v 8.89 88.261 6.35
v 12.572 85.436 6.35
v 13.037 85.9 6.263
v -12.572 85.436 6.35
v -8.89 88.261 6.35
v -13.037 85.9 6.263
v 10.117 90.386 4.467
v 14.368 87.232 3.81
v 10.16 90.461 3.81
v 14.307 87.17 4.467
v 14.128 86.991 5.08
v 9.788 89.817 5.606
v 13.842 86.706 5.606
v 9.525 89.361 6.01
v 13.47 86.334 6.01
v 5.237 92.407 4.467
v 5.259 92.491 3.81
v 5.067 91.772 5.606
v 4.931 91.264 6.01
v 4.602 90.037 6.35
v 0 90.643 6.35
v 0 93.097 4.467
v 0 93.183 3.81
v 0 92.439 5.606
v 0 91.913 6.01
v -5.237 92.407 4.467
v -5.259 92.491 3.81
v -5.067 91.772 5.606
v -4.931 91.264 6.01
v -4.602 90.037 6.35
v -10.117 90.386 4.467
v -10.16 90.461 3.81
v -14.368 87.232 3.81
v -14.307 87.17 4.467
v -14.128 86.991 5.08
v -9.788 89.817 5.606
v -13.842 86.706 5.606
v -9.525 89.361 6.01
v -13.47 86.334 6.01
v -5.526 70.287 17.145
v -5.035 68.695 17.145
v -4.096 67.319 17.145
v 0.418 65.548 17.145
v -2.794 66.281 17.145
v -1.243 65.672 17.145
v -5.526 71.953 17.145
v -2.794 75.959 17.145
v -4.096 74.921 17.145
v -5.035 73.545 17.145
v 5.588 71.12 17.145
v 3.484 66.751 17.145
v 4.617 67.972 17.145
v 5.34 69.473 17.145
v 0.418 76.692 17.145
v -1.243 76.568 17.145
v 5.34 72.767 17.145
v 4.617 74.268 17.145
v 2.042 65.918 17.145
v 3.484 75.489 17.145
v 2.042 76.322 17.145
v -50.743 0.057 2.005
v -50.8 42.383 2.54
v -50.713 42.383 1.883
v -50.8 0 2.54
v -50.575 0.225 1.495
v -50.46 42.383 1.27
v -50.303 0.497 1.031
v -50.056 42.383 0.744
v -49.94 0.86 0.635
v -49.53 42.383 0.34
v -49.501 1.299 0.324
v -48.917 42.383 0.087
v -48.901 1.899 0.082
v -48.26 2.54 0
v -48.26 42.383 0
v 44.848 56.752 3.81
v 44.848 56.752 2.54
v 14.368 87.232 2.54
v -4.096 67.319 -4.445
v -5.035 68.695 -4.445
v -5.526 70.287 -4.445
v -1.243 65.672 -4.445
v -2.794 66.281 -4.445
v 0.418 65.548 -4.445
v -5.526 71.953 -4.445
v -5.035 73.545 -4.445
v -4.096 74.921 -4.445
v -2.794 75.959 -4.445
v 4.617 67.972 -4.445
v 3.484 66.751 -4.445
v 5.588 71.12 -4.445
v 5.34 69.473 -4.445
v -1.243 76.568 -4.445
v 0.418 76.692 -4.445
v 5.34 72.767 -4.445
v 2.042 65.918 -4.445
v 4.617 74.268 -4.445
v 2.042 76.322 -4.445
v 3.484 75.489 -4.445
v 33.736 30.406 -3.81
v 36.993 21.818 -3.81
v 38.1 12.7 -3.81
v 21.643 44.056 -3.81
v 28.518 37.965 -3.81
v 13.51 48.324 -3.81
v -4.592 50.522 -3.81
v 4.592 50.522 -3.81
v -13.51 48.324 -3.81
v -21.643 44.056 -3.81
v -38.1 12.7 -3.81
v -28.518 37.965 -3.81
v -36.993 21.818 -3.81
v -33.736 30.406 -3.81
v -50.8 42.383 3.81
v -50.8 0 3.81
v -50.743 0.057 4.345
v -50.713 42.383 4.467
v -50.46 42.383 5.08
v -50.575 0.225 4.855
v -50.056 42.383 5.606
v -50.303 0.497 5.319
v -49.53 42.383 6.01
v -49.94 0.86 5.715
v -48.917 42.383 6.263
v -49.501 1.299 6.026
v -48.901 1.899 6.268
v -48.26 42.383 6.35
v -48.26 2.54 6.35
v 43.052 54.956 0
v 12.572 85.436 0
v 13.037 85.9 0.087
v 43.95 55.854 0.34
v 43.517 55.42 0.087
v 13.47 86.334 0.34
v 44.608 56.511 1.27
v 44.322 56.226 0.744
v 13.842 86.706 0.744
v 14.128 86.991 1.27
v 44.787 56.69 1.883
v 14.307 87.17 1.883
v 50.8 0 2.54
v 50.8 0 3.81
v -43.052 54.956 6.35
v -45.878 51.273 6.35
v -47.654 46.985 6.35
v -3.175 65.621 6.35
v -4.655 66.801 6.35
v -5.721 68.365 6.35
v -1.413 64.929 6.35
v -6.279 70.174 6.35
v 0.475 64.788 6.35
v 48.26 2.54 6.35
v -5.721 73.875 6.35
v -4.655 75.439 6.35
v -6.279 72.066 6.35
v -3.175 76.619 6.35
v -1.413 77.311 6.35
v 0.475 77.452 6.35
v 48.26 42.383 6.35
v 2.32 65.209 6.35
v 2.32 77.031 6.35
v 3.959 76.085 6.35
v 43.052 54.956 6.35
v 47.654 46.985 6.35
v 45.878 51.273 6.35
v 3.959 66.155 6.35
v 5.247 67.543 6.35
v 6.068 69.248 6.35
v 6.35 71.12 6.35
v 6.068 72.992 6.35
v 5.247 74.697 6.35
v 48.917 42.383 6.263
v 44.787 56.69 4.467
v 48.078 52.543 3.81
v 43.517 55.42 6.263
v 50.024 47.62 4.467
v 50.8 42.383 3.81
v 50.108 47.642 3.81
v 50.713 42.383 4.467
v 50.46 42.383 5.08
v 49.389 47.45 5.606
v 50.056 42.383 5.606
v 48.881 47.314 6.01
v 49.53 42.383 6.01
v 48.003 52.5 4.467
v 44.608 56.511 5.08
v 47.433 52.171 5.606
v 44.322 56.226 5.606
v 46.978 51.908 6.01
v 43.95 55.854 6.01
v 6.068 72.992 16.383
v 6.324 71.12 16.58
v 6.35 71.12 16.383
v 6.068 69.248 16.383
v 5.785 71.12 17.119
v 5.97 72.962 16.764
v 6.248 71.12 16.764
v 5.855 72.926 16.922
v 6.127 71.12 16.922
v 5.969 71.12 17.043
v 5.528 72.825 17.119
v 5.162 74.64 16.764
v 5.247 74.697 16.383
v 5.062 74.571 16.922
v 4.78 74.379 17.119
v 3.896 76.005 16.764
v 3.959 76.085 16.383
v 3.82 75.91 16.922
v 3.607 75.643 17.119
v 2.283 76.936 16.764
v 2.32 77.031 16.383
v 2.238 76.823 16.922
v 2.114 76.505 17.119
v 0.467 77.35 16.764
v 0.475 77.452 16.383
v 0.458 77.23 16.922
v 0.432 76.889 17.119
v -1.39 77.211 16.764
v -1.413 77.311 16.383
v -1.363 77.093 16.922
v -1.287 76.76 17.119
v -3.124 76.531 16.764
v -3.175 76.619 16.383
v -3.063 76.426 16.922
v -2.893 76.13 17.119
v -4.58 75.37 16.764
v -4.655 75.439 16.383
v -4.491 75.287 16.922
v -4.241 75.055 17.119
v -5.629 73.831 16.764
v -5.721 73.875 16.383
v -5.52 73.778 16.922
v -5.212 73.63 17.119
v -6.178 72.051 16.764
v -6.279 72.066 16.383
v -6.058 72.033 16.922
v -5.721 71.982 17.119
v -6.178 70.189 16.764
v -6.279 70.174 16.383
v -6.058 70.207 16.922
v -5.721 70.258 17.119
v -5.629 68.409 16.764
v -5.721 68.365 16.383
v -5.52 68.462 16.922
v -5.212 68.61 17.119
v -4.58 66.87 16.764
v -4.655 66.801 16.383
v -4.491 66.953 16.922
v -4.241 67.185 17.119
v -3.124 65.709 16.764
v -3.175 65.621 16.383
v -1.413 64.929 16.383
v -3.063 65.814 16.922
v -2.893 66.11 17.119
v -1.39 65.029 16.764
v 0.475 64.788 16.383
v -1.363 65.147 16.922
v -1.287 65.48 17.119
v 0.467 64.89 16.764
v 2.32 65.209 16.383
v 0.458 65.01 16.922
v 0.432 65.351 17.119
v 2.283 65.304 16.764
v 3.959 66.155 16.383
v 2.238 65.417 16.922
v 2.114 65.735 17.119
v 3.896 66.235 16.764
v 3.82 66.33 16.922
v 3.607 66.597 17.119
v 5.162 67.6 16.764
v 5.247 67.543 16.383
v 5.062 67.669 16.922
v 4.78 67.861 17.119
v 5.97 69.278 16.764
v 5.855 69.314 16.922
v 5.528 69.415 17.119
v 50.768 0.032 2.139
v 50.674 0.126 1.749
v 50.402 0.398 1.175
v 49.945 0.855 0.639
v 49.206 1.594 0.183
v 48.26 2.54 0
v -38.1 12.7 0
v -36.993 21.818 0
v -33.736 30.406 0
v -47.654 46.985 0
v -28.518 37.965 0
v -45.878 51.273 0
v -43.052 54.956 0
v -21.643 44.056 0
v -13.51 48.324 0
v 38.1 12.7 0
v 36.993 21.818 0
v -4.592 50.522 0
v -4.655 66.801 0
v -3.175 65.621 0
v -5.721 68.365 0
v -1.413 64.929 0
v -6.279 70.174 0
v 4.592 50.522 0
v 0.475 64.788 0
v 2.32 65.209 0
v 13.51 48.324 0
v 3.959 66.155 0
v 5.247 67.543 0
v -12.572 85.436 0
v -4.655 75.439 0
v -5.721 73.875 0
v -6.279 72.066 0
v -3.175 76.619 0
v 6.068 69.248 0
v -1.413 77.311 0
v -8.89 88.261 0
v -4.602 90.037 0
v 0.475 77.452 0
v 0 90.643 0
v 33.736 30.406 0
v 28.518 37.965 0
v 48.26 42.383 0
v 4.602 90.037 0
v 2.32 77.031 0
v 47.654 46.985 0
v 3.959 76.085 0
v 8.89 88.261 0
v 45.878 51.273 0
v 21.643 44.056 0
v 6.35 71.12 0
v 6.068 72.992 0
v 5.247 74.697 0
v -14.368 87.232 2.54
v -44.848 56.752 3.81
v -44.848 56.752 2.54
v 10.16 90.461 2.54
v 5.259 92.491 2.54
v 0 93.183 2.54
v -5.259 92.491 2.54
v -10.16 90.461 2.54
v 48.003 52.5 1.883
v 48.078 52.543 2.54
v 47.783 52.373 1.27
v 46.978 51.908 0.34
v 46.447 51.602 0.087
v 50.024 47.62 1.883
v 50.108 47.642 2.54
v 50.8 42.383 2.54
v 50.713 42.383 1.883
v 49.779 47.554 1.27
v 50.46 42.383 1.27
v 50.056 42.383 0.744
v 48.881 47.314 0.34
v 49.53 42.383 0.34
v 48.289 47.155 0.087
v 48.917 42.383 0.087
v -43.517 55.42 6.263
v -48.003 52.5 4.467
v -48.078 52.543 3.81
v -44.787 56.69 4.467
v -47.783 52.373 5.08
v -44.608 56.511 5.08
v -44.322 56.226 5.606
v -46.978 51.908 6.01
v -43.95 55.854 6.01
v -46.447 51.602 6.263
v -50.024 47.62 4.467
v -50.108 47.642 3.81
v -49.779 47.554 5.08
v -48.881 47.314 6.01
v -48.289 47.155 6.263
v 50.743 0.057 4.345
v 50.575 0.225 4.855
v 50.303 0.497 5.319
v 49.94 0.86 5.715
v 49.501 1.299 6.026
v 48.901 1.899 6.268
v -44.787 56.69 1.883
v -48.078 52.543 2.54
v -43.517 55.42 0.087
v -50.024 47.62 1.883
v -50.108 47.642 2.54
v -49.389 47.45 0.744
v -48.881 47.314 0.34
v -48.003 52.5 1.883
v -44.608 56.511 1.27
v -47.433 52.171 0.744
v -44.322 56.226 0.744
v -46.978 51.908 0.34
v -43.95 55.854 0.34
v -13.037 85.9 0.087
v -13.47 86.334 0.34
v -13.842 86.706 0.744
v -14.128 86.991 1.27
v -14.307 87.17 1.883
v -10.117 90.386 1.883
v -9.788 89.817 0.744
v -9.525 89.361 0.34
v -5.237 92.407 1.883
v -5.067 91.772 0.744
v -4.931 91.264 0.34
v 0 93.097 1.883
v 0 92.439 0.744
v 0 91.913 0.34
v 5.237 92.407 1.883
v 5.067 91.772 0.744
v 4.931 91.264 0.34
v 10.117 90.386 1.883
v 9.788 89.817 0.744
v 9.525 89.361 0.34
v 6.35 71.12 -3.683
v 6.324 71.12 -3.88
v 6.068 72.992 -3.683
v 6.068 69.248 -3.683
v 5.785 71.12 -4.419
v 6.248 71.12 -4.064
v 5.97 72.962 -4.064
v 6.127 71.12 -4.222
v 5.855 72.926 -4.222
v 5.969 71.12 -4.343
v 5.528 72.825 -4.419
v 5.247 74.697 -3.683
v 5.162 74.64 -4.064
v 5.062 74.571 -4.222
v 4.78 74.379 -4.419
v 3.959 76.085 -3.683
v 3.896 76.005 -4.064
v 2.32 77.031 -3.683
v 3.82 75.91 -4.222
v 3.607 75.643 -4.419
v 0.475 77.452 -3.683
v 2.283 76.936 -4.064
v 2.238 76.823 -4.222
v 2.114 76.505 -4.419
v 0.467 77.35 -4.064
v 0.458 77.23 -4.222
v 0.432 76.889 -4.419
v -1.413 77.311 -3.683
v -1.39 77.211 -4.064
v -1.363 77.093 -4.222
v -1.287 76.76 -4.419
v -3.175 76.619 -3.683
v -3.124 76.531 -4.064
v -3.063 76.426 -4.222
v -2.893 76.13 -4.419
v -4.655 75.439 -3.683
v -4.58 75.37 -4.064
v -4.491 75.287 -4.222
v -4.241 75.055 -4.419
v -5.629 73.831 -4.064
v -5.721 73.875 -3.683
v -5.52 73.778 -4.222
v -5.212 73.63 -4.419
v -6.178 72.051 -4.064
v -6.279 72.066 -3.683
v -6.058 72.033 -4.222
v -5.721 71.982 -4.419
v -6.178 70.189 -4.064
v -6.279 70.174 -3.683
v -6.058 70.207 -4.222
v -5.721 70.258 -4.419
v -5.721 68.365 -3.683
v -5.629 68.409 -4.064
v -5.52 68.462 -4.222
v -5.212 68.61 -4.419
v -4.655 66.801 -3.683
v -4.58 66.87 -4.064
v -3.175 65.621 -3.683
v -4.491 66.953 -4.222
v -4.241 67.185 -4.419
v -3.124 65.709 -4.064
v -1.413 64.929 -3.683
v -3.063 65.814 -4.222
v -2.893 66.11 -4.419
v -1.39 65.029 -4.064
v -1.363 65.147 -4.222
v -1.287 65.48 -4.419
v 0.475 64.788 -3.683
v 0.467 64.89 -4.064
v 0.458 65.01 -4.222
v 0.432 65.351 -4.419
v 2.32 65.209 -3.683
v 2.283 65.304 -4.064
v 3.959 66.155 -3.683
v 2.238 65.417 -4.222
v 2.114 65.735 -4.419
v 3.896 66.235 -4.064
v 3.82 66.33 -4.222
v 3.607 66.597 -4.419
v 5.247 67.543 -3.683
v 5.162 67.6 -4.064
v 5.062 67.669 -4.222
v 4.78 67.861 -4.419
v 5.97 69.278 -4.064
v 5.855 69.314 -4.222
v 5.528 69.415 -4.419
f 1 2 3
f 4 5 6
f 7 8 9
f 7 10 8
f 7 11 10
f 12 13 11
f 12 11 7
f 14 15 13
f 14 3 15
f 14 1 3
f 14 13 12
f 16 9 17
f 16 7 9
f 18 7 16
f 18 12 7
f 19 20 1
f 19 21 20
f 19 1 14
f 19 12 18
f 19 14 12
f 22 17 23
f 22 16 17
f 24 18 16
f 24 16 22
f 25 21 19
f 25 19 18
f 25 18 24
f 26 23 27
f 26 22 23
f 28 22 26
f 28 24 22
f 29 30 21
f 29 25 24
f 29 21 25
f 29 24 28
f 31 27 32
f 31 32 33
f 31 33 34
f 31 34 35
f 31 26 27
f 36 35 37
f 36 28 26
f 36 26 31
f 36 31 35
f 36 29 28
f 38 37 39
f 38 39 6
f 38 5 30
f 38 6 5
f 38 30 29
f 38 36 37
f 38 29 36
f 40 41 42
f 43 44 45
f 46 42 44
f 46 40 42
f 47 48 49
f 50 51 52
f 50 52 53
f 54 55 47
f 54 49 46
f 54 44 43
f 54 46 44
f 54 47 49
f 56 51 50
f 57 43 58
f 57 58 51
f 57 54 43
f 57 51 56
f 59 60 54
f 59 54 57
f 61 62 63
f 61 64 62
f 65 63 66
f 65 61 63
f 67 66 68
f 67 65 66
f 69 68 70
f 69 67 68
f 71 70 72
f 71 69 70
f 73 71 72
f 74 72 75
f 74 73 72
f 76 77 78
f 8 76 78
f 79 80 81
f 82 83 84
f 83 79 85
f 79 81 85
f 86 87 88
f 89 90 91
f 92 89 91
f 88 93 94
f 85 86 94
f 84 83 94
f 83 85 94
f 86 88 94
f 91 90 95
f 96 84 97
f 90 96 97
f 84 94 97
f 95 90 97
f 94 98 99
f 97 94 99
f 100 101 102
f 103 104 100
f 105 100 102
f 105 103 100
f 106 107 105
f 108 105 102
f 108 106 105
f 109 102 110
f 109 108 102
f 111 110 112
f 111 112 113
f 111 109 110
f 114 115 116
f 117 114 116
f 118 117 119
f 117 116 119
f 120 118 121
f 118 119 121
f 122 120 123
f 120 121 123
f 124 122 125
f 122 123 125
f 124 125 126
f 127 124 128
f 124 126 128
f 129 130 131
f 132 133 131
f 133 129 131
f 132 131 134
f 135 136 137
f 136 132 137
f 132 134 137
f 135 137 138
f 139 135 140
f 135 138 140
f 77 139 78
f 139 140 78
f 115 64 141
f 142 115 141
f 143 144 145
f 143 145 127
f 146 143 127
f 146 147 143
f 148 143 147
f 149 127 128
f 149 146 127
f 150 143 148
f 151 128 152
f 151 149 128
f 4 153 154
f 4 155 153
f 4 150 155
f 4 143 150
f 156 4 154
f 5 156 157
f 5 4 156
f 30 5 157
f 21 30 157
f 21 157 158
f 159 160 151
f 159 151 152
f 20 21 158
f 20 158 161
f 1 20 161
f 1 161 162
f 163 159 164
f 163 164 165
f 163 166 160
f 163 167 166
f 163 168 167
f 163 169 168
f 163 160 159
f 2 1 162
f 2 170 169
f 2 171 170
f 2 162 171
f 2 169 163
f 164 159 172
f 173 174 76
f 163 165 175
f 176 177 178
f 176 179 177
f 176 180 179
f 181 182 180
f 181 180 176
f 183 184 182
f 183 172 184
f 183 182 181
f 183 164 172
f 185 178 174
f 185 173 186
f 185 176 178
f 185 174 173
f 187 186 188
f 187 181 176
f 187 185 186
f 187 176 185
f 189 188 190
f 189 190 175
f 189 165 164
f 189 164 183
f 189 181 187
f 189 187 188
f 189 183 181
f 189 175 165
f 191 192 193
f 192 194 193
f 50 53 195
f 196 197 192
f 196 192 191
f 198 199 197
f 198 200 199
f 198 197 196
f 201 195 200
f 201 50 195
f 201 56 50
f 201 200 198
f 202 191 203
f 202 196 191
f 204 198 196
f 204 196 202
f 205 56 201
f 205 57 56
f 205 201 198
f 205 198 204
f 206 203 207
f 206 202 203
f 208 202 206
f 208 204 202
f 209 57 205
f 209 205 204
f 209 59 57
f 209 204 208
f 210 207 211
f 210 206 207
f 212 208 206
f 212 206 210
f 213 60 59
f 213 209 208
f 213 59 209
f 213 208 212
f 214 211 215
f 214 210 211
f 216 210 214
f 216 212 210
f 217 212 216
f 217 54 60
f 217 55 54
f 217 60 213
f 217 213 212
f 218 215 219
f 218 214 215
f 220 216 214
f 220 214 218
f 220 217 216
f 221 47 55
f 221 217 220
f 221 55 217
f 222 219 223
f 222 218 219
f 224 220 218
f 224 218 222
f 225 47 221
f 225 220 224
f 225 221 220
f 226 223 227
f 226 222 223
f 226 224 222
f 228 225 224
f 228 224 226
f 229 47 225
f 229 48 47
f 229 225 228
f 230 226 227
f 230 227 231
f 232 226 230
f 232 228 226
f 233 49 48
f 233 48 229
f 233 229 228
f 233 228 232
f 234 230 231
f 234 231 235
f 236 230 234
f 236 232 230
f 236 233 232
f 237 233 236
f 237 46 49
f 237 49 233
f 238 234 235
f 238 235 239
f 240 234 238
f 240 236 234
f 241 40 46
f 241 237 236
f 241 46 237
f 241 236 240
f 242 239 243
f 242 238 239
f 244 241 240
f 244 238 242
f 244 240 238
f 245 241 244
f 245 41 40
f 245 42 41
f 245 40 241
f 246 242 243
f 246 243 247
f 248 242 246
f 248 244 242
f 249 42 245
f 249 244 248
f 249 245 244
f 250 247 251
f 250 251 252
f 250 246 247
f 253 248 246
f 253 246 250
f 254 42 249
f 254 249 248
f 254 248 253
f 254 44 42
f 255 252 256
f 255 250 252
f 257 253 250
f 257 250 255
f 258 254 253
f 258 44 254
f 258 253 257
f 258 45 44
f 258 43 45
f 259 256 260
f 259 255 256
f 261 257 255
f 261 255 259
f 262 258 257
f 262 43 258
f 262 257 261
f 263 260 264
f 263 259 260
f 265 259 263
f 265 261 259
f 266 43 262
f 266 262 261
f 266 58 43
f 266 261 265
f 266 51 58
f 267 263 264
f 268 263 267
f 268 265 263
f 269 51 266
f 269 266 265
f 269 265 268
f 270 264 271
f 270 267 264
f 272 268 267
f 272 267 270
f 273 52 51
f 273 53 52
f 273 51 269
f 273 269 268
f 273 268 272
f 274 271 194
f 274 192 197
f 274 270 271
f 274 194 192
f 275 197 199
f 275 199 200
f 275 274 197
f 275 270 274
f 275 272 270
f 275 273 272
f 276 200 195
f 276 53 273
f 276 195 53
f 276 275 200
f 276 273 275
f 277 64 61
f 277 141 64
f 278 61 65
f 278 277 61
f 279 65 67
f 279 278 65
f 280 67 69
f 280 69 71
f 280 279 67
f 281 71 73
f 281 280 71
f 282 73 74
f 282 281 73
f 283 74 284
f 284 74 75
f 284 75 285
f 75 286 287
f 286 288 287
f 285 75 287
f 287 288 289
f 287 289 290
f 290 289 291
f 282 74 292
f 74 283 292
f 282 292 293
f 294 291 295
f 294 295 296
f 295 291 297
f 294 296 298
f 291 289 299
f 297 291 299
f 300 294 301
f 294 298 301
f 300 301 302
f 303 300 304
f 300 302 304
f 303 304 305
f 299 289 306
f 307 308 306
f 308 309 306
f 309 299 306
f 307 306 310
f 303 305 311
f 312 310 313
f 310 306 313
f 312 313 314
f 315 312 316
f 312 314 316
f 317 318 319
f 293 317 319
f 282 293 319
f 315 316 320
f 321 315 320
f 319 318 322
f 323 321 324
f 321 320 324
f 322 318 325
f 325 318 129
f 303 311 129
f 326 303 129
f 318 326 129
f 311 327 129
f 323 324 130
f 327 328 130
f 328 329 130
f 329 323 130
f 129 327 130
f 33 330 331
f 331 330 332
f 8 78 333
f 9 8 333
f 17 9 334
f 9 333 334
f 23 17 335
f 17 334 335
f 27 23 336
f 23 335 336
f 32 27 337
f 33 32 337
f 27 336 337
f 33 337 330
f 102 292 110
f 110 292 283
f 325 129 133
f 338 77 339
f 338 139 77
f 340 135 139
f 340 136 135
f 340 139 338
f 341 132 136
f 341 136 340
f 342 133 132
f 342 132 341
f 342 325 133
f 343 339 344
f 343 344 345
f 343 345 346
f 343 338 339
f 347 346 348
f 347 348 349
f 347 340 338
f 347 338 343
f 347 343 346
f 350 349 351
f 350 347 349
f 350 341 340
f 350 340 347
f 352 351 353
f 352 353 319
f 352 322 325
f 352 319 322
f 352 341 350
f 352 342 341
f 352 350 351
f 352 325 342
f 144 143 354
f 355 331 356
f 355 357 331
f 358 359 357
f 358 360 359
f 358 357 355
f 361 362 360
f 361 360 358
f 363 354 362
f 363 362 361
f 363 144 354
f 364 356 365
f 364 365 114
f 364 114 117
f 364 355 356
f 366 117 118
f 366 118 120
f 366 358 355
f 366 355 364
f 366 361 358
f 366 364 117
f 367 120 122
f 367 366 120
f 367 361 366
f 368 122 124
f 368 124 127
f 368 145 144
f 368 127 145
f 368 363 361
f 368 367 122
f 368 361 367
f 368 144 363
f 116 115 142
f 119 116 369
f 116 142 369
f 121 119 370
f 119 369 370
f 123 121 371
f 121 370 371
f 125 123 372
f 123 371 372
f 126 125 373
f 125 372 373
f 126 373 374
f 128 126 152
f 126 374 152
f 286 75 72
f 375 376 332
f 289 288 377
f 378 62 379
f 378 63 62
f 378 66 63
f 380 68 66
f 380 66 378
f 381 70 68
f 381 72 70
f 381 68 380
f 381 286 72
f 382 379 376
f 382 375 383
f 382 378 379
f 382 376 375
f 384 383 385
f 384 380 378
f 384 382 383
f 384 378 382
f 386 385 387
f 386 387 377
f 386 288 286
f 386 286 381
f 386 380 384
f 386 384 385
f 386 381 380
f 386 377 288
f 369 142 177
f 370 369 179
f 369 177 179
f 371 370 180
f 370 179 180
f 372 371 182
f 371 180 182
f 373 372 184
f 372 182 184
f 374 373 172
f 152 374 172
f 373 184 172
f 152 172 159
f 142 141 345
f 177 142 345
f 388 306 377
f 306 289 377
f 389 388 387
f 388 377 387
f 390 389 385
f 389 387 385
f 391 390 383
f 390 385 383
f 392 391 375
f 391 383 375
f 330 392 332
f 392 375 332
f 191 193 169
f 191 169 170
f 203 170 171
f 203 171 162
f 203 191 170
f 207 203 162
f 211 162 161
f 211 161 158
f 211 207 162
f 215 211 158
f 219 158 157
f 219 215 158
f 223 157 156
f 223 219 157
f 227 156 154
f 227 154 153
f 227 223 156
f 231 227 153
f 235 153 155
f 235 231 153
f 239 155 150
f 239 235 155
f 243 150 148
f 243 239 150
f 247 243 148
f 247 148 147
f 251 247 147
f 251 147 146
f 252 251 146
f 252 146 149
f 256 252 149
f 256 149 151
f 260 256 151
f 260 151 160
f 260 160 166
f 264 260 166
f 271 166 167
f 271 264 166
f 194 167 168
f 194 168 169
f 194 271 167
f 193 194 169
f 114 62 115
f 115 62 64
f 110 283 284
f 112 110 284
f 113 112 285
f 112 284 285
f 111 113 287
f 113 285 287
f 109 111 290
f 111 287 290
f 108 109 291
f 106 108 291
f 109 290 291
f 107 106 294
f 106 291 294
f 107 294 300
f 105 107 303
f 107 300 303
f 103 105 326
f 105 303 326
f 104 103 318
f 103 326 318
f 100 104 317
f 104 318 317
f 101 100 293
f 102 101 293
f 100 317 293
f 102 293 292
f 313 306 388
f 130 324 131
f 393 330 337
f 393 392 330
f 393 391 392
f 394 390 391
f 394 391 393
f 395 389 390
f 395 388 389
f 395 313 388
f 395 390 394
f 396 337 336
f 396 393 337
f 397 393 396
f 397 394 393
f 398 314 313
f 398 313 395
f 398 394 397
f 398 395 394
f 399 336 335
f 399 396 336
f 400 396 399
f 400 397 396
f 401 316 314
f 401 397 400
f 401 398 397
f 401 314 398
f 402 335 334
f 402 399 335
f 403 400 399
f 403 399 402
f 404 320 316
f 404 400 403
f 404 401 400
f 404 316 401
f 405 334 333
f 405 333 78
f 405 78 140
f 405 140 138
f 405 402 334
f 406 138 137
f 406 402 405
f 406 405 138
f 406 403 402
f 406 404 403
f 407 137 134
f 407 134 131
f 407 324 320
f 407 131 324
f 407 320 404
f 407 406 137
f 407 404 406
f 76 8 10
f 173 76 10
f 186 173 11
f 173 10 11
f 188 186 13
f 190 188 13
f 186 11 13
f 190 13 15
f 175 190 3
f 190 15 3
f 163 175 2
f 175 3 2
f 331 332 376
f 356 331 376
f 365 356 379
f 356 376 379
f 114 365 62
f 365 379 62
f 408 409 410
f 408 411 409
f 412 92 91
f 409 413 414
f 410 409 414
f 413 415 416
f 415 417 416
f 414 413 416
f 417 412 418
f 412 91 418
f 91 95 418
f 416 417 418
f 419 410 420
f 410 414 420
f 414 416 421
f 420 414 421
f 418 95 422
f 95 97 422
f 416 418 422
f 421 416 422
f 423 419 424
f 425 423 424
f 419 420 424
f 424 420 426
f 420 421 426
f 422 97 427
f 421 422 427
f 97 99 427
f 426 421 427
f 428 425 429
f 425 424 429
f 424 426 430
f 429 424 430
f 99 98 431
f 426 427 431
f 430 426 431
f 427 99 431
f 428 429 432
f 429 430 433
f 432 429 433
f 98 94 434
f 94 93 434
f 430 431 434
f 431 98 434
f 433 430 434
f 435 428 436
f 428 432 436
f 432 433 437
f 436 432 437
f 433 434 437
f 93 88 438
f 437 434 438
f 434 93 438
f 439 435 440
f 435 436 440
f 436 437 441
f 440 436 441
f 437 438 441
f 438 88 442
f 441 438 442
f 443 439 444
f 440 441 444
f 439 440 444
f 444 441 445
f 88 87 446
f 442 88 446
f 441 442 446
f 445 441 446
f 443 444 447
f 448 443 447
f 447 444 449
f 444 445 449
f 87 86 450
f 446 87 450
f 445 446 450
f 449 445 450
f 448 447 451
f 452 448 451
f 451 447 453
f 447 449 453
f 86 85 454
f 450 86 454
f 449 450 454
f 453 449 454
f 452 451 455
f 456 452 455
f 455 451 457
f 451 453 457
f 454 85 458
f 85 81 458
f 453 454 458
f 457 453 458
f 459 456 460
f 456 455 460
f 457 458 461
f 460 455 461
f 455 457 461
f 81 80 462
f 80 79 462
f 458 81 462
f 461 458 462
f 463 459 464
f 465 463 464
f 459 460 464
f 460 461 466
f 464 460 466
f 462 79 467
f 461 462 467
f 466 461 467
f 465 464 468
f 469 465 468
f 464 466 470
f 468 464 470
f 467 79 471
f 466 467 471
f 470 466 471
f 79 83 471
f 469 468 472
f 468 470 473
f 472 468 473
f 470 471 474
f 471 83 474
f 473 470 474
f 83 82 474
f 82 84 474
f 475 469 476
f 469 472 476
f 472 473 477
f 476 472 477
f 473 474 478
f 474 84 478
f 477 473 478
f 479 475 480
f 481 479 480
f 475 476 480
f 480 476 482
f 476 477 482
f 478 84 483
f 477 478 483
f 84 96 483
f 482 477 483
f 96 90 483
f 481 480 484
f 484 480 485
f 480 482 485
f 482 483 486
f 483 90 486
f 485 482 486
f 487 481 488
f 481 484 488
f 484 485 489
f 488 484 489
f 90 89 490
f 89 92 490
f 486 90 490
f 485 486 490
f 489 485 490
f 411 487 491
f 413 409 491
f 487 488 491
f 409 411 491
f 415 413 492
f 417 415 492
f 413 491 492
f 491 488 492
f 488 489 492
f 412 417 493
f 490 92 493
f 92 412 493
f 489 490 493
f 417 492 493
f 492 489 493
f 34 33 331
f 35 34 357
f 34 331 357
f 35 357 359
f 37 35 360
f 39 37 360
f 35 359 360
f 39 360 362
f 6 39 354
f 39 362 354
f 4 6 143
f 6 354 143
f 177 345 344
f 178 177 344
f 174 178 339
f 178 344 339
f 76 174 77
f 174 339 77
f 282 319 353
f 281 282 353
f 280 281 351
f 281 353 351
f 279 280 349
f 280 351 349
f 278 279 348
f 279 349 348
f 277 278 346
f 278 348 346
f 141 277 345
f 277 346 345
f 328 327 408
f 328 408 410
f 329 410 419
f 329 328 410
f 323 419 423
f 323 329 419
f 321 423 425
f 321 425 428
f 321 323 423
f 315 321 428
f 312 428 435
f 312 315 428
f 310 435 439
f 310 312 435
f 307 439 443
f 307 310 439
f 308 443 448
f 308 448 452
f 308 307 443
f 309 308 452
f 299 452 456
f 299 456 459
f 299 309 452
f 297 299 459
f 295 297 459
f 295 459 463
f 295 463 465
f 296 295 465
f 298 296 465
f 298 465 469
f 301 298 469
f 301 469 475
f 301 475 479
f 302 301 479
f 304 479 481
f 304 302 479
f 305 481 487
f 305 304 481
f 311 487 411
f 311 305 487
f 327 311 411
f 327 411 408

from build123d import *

# Parameters (mm, degrees)
BOSS_EXTRUDE1_DEPTH = 6.35
FILLET1_R           = 2.54
FILLET2_R           = 2.54
FILLET3_R           = 20.32
SKETCH3_R           = 6.35
BOSS_EXTRUDE2_DEPTH = 10.795
FILLET5_R           = 0.762
BOSS_EXTRUDE3_DEPTH = 3.81


with BuildPart() as part:
    # Sketch1 → Boss-Extrude1 (new body)
    with BuildSketch(Plane.XY):
        Polygon((-50.8, 0), (50.8, 0), (50.8, 50.8), (0, 101.6), (-50.8, 50.8), align=None)
    extrude(amount=BOSS_EXTRUDE1_DEPTH)

    # Fillet1
    fillet1_edges = [part.edges().sort_by_distance(p)[0] for p in [
        (50.8, 25.4, 6.35),
        (25.4, 76.2, 6.35),
        (-25.4, 76.2, 6.35),
        (-50.8, 25.4, 6.35),
        (0, 0, 6.35),
    ]]
    fillet(fillet1_edges, radius=FILLET1_R)

    # Fillet2
    fillet2_edges = [part.edges().sort_by_distance(p)[0] for p in [
        (-25.4, 76.2, 0),
        (25.4, 76.2, 0),
        (50.8, 25.4, 0),
        (0, 0, 0),
        (-50.8, 25.4, 0),
    ]]
    fillet(fillet2_edges, radius=FILLET2_R)

    # Fillet3
    # the kernel refuses this fillet: 20.32 mm, written as the material it takes off along each edge
    with BuildSketch(Plane(origin=(30.48, 42.383180413, 6.35), x_dir=(1, 0, 0), z_dir=(0, -1, 0))) as fillet3_piece_1:
        with BuildLine():
            CenterArc((17.78, -2.54), 2.54, 0, 90)
            Line((20.32, -2.54), (20.32, 0))
            Line((20.32, 0), (17.78, 0))
        make_face()
    revolve(axis=Axis((30.48, 42.383180413, 6.35), (0, 0, 1)), revolution_arc=45, mode=Mode.SUBTRACT)
    with BuildSketch(Plane(origin=(0, 72.863180413, 6.35), x_dir=(0.7071067811865475, 0.7071067811865477, 0), z_dir=(0.7071067811865477, -0.7071067811865475, 0))) as fillet3_piece_2:
        with BuildLine():
            CenterArc((17.78, -2.54), 2.54, 0, 90)
            Line((20.32, -2.54), (20.32, 0))
            Line((20.32, 0), (17.78, 0))
        make_face()
    revolve(axis=Axis((0, 72.863180413, 6.35), (0, 0, 1)), revolution_arc=90, mode=Mode.SUBTRACT)
    with BuildSketch(Plane(origin=(-30.48, 42.383180413, 6.35), x_dir=(-0.7071067811865475, 0.7071067811865476, 0), z_dir=(0.7071067811865476, 0.7071067811865475, 0))) as fillet3_piece_3:
        with BuildLine():
            CenterArc((17.78, -2.54), 2.54, 0, 90)
            Line((20.32, -2.54), (20.32, 0))
            Line((20.32, 0), (17.78, 0))
        make_face()
    revolve(axis=Axis((-30.48, 42.383180413, 6.35), (0, 0, 1)), revolution_arc=45, mode=Mode.SUBTRACT)
    with BuildSketch(Plane(origin=(30.48, 42.383180413, 0), x_dir=(0.7071067811865475, 0.7071067811865477, 0), z_dir=(-0.7071067811865477, 0.7071067811865475, 0))) as fillet3_piece_4:
        with BuildLine():
            CenterArc((17.78, -2.54), 2.54, 0, 90)
            Line((20.32, -2.54), (20.32, 0))
            Line((20.32, 0), (17.78, 0))
        make_face()
    revolve(axis=Axis((30.48, 42.383180413, 0), (0, 0, -1)), revolution_arc=45, mode=Mode.SUBTRACT)
    with BuildSketch(Plane(origin=(0, 72.863180413, 0), x_dir=(-0.7071067811865475, 0.7071067811865476, 0), z_dir=(-0.7071067811865476, -0.7071067811865475, 0))) as fillet3_piece_5:
        with BuildLine():
            CenterArc((17.78, -2.54), 2.54, 0, 90)
            Line((20.32, -2.54), (20.32, 0))
            Line((20.32, 0), (17.78, 0))
        make_face()
    revolve(axis=Axis((0, 72.863180413, 0), (0, 0, -1)), revolution_arc=90, mode=Mode.SUBTRACT)
    with BuildSketch(Plane(origin=(-30.48, 42.383180413, 0), x_dir=(-1, 0, 0), z_dir=(0, -1, 0))) as fillet3_piece_6:
        with BuildLine():
            CenterArc((17.78, -2.54), 2.54, 0, 90)
            Line((20.32, -2.54), (20.32, 0))
            Line((20.32, 0), (17.78, 0))
        make_face()
    revolve(axis=Axis((-30.48, 42.383180413, 0), (0, 0, -1)), revolution_arc=45, mode=Mode.SUBTRACT)
    with BuildSketch(Plane(origin=(-50.8, 50.8, 0), x_dir=(0, -1, 0), z_dir=(0, 0, 1))) as fillet3_piece_7:
        with BuildLine():
            CenterArc((FILLET3_R * 0.414213562373, FILLET3_R), FILLET3_R, 225, 45)
            Line((-FILLET3_R * 0.292893218813, FILLET3_R * 0.292893218813), (0, 0))
            Line((0, 0), (FILLET3_R * 0.414213562373, 0))
        make_face()
    extrude(amount=6.35, mode=Mode.SUBTRACT)
    with BuildSketch(Plane(origin=(50.8, 50.8, 0), x_dir=(0, -1, 0), z_dir=(0, 0, 1))) as fillet3_piece_8:
        with BuildLine():
            CenterArc((FILLET3_R * 0.414213562373, -FILLET3_R), FILLET3_R, 90, 45)
            Line((-FILLET3_R * 0.292893218813, -FILLET3_R * 0.292893218813), (0, 0))
            Line((0, 0), (FILLET3_R * 0.414213562373, 0))
        make_face()
    extrude(amount=6.35, mode=Mode.SUBTRACT)
    with BuildSketch(Plane(origin=(0, 101.6, 0), x_dir=(-0.7071067811865476, -0.7071067811865476, 0), z_dir=(0, 0, 1))) as fillet3_piece_9:
        with BuildLine():
            CenterArc((FILLET3_R, FILLET3_R), FILLET3_R, 180, 90)
            Line((0, FILLET3_R), (0, 0))
            Line((0, 0), (FILLET3_R, 0))
        make_face()
    extrude(amount=6.35, mode=Mode.SUBTRACT)

    # Sketch3 → Boss-Extrude2 (add, symmetric)
    with BuildSketch(Plane.XY.offset(6.35)):
        with Locations((0, 71.12)):
            Circle(SKETCH3_R)
    extrude(amount=BOSS_EXTRUDE2_DEPTH, both=True)

    # Fillet5
    fillet5_edges = [part.edges().sort_by_distance(p)[0] for p in [
        (-6.35, 71.12, -4.445),
        (-6.35, 71.12, 17.145),
    ]]
    fillet(fillet5_edges, radius=FILLET5_R)

    # Sketch4 → Boss-Extrude3 (add)
    with BuildSketch(Plane(origin=(0, 0, 0), x_dir=(-1, 0, 0), z_dir=(0, 0, -1))):
        with BuildLine():
            Line((-38.1, 12.7), (38.1, 12.7))
            ThreePointArc((38.1, 12.7), (0, 50.8), (-38.1, 12.7))
        make_face()
    extrude(amount=BOSS_EXTRUDE3_DEPTH)


solid = part.part
